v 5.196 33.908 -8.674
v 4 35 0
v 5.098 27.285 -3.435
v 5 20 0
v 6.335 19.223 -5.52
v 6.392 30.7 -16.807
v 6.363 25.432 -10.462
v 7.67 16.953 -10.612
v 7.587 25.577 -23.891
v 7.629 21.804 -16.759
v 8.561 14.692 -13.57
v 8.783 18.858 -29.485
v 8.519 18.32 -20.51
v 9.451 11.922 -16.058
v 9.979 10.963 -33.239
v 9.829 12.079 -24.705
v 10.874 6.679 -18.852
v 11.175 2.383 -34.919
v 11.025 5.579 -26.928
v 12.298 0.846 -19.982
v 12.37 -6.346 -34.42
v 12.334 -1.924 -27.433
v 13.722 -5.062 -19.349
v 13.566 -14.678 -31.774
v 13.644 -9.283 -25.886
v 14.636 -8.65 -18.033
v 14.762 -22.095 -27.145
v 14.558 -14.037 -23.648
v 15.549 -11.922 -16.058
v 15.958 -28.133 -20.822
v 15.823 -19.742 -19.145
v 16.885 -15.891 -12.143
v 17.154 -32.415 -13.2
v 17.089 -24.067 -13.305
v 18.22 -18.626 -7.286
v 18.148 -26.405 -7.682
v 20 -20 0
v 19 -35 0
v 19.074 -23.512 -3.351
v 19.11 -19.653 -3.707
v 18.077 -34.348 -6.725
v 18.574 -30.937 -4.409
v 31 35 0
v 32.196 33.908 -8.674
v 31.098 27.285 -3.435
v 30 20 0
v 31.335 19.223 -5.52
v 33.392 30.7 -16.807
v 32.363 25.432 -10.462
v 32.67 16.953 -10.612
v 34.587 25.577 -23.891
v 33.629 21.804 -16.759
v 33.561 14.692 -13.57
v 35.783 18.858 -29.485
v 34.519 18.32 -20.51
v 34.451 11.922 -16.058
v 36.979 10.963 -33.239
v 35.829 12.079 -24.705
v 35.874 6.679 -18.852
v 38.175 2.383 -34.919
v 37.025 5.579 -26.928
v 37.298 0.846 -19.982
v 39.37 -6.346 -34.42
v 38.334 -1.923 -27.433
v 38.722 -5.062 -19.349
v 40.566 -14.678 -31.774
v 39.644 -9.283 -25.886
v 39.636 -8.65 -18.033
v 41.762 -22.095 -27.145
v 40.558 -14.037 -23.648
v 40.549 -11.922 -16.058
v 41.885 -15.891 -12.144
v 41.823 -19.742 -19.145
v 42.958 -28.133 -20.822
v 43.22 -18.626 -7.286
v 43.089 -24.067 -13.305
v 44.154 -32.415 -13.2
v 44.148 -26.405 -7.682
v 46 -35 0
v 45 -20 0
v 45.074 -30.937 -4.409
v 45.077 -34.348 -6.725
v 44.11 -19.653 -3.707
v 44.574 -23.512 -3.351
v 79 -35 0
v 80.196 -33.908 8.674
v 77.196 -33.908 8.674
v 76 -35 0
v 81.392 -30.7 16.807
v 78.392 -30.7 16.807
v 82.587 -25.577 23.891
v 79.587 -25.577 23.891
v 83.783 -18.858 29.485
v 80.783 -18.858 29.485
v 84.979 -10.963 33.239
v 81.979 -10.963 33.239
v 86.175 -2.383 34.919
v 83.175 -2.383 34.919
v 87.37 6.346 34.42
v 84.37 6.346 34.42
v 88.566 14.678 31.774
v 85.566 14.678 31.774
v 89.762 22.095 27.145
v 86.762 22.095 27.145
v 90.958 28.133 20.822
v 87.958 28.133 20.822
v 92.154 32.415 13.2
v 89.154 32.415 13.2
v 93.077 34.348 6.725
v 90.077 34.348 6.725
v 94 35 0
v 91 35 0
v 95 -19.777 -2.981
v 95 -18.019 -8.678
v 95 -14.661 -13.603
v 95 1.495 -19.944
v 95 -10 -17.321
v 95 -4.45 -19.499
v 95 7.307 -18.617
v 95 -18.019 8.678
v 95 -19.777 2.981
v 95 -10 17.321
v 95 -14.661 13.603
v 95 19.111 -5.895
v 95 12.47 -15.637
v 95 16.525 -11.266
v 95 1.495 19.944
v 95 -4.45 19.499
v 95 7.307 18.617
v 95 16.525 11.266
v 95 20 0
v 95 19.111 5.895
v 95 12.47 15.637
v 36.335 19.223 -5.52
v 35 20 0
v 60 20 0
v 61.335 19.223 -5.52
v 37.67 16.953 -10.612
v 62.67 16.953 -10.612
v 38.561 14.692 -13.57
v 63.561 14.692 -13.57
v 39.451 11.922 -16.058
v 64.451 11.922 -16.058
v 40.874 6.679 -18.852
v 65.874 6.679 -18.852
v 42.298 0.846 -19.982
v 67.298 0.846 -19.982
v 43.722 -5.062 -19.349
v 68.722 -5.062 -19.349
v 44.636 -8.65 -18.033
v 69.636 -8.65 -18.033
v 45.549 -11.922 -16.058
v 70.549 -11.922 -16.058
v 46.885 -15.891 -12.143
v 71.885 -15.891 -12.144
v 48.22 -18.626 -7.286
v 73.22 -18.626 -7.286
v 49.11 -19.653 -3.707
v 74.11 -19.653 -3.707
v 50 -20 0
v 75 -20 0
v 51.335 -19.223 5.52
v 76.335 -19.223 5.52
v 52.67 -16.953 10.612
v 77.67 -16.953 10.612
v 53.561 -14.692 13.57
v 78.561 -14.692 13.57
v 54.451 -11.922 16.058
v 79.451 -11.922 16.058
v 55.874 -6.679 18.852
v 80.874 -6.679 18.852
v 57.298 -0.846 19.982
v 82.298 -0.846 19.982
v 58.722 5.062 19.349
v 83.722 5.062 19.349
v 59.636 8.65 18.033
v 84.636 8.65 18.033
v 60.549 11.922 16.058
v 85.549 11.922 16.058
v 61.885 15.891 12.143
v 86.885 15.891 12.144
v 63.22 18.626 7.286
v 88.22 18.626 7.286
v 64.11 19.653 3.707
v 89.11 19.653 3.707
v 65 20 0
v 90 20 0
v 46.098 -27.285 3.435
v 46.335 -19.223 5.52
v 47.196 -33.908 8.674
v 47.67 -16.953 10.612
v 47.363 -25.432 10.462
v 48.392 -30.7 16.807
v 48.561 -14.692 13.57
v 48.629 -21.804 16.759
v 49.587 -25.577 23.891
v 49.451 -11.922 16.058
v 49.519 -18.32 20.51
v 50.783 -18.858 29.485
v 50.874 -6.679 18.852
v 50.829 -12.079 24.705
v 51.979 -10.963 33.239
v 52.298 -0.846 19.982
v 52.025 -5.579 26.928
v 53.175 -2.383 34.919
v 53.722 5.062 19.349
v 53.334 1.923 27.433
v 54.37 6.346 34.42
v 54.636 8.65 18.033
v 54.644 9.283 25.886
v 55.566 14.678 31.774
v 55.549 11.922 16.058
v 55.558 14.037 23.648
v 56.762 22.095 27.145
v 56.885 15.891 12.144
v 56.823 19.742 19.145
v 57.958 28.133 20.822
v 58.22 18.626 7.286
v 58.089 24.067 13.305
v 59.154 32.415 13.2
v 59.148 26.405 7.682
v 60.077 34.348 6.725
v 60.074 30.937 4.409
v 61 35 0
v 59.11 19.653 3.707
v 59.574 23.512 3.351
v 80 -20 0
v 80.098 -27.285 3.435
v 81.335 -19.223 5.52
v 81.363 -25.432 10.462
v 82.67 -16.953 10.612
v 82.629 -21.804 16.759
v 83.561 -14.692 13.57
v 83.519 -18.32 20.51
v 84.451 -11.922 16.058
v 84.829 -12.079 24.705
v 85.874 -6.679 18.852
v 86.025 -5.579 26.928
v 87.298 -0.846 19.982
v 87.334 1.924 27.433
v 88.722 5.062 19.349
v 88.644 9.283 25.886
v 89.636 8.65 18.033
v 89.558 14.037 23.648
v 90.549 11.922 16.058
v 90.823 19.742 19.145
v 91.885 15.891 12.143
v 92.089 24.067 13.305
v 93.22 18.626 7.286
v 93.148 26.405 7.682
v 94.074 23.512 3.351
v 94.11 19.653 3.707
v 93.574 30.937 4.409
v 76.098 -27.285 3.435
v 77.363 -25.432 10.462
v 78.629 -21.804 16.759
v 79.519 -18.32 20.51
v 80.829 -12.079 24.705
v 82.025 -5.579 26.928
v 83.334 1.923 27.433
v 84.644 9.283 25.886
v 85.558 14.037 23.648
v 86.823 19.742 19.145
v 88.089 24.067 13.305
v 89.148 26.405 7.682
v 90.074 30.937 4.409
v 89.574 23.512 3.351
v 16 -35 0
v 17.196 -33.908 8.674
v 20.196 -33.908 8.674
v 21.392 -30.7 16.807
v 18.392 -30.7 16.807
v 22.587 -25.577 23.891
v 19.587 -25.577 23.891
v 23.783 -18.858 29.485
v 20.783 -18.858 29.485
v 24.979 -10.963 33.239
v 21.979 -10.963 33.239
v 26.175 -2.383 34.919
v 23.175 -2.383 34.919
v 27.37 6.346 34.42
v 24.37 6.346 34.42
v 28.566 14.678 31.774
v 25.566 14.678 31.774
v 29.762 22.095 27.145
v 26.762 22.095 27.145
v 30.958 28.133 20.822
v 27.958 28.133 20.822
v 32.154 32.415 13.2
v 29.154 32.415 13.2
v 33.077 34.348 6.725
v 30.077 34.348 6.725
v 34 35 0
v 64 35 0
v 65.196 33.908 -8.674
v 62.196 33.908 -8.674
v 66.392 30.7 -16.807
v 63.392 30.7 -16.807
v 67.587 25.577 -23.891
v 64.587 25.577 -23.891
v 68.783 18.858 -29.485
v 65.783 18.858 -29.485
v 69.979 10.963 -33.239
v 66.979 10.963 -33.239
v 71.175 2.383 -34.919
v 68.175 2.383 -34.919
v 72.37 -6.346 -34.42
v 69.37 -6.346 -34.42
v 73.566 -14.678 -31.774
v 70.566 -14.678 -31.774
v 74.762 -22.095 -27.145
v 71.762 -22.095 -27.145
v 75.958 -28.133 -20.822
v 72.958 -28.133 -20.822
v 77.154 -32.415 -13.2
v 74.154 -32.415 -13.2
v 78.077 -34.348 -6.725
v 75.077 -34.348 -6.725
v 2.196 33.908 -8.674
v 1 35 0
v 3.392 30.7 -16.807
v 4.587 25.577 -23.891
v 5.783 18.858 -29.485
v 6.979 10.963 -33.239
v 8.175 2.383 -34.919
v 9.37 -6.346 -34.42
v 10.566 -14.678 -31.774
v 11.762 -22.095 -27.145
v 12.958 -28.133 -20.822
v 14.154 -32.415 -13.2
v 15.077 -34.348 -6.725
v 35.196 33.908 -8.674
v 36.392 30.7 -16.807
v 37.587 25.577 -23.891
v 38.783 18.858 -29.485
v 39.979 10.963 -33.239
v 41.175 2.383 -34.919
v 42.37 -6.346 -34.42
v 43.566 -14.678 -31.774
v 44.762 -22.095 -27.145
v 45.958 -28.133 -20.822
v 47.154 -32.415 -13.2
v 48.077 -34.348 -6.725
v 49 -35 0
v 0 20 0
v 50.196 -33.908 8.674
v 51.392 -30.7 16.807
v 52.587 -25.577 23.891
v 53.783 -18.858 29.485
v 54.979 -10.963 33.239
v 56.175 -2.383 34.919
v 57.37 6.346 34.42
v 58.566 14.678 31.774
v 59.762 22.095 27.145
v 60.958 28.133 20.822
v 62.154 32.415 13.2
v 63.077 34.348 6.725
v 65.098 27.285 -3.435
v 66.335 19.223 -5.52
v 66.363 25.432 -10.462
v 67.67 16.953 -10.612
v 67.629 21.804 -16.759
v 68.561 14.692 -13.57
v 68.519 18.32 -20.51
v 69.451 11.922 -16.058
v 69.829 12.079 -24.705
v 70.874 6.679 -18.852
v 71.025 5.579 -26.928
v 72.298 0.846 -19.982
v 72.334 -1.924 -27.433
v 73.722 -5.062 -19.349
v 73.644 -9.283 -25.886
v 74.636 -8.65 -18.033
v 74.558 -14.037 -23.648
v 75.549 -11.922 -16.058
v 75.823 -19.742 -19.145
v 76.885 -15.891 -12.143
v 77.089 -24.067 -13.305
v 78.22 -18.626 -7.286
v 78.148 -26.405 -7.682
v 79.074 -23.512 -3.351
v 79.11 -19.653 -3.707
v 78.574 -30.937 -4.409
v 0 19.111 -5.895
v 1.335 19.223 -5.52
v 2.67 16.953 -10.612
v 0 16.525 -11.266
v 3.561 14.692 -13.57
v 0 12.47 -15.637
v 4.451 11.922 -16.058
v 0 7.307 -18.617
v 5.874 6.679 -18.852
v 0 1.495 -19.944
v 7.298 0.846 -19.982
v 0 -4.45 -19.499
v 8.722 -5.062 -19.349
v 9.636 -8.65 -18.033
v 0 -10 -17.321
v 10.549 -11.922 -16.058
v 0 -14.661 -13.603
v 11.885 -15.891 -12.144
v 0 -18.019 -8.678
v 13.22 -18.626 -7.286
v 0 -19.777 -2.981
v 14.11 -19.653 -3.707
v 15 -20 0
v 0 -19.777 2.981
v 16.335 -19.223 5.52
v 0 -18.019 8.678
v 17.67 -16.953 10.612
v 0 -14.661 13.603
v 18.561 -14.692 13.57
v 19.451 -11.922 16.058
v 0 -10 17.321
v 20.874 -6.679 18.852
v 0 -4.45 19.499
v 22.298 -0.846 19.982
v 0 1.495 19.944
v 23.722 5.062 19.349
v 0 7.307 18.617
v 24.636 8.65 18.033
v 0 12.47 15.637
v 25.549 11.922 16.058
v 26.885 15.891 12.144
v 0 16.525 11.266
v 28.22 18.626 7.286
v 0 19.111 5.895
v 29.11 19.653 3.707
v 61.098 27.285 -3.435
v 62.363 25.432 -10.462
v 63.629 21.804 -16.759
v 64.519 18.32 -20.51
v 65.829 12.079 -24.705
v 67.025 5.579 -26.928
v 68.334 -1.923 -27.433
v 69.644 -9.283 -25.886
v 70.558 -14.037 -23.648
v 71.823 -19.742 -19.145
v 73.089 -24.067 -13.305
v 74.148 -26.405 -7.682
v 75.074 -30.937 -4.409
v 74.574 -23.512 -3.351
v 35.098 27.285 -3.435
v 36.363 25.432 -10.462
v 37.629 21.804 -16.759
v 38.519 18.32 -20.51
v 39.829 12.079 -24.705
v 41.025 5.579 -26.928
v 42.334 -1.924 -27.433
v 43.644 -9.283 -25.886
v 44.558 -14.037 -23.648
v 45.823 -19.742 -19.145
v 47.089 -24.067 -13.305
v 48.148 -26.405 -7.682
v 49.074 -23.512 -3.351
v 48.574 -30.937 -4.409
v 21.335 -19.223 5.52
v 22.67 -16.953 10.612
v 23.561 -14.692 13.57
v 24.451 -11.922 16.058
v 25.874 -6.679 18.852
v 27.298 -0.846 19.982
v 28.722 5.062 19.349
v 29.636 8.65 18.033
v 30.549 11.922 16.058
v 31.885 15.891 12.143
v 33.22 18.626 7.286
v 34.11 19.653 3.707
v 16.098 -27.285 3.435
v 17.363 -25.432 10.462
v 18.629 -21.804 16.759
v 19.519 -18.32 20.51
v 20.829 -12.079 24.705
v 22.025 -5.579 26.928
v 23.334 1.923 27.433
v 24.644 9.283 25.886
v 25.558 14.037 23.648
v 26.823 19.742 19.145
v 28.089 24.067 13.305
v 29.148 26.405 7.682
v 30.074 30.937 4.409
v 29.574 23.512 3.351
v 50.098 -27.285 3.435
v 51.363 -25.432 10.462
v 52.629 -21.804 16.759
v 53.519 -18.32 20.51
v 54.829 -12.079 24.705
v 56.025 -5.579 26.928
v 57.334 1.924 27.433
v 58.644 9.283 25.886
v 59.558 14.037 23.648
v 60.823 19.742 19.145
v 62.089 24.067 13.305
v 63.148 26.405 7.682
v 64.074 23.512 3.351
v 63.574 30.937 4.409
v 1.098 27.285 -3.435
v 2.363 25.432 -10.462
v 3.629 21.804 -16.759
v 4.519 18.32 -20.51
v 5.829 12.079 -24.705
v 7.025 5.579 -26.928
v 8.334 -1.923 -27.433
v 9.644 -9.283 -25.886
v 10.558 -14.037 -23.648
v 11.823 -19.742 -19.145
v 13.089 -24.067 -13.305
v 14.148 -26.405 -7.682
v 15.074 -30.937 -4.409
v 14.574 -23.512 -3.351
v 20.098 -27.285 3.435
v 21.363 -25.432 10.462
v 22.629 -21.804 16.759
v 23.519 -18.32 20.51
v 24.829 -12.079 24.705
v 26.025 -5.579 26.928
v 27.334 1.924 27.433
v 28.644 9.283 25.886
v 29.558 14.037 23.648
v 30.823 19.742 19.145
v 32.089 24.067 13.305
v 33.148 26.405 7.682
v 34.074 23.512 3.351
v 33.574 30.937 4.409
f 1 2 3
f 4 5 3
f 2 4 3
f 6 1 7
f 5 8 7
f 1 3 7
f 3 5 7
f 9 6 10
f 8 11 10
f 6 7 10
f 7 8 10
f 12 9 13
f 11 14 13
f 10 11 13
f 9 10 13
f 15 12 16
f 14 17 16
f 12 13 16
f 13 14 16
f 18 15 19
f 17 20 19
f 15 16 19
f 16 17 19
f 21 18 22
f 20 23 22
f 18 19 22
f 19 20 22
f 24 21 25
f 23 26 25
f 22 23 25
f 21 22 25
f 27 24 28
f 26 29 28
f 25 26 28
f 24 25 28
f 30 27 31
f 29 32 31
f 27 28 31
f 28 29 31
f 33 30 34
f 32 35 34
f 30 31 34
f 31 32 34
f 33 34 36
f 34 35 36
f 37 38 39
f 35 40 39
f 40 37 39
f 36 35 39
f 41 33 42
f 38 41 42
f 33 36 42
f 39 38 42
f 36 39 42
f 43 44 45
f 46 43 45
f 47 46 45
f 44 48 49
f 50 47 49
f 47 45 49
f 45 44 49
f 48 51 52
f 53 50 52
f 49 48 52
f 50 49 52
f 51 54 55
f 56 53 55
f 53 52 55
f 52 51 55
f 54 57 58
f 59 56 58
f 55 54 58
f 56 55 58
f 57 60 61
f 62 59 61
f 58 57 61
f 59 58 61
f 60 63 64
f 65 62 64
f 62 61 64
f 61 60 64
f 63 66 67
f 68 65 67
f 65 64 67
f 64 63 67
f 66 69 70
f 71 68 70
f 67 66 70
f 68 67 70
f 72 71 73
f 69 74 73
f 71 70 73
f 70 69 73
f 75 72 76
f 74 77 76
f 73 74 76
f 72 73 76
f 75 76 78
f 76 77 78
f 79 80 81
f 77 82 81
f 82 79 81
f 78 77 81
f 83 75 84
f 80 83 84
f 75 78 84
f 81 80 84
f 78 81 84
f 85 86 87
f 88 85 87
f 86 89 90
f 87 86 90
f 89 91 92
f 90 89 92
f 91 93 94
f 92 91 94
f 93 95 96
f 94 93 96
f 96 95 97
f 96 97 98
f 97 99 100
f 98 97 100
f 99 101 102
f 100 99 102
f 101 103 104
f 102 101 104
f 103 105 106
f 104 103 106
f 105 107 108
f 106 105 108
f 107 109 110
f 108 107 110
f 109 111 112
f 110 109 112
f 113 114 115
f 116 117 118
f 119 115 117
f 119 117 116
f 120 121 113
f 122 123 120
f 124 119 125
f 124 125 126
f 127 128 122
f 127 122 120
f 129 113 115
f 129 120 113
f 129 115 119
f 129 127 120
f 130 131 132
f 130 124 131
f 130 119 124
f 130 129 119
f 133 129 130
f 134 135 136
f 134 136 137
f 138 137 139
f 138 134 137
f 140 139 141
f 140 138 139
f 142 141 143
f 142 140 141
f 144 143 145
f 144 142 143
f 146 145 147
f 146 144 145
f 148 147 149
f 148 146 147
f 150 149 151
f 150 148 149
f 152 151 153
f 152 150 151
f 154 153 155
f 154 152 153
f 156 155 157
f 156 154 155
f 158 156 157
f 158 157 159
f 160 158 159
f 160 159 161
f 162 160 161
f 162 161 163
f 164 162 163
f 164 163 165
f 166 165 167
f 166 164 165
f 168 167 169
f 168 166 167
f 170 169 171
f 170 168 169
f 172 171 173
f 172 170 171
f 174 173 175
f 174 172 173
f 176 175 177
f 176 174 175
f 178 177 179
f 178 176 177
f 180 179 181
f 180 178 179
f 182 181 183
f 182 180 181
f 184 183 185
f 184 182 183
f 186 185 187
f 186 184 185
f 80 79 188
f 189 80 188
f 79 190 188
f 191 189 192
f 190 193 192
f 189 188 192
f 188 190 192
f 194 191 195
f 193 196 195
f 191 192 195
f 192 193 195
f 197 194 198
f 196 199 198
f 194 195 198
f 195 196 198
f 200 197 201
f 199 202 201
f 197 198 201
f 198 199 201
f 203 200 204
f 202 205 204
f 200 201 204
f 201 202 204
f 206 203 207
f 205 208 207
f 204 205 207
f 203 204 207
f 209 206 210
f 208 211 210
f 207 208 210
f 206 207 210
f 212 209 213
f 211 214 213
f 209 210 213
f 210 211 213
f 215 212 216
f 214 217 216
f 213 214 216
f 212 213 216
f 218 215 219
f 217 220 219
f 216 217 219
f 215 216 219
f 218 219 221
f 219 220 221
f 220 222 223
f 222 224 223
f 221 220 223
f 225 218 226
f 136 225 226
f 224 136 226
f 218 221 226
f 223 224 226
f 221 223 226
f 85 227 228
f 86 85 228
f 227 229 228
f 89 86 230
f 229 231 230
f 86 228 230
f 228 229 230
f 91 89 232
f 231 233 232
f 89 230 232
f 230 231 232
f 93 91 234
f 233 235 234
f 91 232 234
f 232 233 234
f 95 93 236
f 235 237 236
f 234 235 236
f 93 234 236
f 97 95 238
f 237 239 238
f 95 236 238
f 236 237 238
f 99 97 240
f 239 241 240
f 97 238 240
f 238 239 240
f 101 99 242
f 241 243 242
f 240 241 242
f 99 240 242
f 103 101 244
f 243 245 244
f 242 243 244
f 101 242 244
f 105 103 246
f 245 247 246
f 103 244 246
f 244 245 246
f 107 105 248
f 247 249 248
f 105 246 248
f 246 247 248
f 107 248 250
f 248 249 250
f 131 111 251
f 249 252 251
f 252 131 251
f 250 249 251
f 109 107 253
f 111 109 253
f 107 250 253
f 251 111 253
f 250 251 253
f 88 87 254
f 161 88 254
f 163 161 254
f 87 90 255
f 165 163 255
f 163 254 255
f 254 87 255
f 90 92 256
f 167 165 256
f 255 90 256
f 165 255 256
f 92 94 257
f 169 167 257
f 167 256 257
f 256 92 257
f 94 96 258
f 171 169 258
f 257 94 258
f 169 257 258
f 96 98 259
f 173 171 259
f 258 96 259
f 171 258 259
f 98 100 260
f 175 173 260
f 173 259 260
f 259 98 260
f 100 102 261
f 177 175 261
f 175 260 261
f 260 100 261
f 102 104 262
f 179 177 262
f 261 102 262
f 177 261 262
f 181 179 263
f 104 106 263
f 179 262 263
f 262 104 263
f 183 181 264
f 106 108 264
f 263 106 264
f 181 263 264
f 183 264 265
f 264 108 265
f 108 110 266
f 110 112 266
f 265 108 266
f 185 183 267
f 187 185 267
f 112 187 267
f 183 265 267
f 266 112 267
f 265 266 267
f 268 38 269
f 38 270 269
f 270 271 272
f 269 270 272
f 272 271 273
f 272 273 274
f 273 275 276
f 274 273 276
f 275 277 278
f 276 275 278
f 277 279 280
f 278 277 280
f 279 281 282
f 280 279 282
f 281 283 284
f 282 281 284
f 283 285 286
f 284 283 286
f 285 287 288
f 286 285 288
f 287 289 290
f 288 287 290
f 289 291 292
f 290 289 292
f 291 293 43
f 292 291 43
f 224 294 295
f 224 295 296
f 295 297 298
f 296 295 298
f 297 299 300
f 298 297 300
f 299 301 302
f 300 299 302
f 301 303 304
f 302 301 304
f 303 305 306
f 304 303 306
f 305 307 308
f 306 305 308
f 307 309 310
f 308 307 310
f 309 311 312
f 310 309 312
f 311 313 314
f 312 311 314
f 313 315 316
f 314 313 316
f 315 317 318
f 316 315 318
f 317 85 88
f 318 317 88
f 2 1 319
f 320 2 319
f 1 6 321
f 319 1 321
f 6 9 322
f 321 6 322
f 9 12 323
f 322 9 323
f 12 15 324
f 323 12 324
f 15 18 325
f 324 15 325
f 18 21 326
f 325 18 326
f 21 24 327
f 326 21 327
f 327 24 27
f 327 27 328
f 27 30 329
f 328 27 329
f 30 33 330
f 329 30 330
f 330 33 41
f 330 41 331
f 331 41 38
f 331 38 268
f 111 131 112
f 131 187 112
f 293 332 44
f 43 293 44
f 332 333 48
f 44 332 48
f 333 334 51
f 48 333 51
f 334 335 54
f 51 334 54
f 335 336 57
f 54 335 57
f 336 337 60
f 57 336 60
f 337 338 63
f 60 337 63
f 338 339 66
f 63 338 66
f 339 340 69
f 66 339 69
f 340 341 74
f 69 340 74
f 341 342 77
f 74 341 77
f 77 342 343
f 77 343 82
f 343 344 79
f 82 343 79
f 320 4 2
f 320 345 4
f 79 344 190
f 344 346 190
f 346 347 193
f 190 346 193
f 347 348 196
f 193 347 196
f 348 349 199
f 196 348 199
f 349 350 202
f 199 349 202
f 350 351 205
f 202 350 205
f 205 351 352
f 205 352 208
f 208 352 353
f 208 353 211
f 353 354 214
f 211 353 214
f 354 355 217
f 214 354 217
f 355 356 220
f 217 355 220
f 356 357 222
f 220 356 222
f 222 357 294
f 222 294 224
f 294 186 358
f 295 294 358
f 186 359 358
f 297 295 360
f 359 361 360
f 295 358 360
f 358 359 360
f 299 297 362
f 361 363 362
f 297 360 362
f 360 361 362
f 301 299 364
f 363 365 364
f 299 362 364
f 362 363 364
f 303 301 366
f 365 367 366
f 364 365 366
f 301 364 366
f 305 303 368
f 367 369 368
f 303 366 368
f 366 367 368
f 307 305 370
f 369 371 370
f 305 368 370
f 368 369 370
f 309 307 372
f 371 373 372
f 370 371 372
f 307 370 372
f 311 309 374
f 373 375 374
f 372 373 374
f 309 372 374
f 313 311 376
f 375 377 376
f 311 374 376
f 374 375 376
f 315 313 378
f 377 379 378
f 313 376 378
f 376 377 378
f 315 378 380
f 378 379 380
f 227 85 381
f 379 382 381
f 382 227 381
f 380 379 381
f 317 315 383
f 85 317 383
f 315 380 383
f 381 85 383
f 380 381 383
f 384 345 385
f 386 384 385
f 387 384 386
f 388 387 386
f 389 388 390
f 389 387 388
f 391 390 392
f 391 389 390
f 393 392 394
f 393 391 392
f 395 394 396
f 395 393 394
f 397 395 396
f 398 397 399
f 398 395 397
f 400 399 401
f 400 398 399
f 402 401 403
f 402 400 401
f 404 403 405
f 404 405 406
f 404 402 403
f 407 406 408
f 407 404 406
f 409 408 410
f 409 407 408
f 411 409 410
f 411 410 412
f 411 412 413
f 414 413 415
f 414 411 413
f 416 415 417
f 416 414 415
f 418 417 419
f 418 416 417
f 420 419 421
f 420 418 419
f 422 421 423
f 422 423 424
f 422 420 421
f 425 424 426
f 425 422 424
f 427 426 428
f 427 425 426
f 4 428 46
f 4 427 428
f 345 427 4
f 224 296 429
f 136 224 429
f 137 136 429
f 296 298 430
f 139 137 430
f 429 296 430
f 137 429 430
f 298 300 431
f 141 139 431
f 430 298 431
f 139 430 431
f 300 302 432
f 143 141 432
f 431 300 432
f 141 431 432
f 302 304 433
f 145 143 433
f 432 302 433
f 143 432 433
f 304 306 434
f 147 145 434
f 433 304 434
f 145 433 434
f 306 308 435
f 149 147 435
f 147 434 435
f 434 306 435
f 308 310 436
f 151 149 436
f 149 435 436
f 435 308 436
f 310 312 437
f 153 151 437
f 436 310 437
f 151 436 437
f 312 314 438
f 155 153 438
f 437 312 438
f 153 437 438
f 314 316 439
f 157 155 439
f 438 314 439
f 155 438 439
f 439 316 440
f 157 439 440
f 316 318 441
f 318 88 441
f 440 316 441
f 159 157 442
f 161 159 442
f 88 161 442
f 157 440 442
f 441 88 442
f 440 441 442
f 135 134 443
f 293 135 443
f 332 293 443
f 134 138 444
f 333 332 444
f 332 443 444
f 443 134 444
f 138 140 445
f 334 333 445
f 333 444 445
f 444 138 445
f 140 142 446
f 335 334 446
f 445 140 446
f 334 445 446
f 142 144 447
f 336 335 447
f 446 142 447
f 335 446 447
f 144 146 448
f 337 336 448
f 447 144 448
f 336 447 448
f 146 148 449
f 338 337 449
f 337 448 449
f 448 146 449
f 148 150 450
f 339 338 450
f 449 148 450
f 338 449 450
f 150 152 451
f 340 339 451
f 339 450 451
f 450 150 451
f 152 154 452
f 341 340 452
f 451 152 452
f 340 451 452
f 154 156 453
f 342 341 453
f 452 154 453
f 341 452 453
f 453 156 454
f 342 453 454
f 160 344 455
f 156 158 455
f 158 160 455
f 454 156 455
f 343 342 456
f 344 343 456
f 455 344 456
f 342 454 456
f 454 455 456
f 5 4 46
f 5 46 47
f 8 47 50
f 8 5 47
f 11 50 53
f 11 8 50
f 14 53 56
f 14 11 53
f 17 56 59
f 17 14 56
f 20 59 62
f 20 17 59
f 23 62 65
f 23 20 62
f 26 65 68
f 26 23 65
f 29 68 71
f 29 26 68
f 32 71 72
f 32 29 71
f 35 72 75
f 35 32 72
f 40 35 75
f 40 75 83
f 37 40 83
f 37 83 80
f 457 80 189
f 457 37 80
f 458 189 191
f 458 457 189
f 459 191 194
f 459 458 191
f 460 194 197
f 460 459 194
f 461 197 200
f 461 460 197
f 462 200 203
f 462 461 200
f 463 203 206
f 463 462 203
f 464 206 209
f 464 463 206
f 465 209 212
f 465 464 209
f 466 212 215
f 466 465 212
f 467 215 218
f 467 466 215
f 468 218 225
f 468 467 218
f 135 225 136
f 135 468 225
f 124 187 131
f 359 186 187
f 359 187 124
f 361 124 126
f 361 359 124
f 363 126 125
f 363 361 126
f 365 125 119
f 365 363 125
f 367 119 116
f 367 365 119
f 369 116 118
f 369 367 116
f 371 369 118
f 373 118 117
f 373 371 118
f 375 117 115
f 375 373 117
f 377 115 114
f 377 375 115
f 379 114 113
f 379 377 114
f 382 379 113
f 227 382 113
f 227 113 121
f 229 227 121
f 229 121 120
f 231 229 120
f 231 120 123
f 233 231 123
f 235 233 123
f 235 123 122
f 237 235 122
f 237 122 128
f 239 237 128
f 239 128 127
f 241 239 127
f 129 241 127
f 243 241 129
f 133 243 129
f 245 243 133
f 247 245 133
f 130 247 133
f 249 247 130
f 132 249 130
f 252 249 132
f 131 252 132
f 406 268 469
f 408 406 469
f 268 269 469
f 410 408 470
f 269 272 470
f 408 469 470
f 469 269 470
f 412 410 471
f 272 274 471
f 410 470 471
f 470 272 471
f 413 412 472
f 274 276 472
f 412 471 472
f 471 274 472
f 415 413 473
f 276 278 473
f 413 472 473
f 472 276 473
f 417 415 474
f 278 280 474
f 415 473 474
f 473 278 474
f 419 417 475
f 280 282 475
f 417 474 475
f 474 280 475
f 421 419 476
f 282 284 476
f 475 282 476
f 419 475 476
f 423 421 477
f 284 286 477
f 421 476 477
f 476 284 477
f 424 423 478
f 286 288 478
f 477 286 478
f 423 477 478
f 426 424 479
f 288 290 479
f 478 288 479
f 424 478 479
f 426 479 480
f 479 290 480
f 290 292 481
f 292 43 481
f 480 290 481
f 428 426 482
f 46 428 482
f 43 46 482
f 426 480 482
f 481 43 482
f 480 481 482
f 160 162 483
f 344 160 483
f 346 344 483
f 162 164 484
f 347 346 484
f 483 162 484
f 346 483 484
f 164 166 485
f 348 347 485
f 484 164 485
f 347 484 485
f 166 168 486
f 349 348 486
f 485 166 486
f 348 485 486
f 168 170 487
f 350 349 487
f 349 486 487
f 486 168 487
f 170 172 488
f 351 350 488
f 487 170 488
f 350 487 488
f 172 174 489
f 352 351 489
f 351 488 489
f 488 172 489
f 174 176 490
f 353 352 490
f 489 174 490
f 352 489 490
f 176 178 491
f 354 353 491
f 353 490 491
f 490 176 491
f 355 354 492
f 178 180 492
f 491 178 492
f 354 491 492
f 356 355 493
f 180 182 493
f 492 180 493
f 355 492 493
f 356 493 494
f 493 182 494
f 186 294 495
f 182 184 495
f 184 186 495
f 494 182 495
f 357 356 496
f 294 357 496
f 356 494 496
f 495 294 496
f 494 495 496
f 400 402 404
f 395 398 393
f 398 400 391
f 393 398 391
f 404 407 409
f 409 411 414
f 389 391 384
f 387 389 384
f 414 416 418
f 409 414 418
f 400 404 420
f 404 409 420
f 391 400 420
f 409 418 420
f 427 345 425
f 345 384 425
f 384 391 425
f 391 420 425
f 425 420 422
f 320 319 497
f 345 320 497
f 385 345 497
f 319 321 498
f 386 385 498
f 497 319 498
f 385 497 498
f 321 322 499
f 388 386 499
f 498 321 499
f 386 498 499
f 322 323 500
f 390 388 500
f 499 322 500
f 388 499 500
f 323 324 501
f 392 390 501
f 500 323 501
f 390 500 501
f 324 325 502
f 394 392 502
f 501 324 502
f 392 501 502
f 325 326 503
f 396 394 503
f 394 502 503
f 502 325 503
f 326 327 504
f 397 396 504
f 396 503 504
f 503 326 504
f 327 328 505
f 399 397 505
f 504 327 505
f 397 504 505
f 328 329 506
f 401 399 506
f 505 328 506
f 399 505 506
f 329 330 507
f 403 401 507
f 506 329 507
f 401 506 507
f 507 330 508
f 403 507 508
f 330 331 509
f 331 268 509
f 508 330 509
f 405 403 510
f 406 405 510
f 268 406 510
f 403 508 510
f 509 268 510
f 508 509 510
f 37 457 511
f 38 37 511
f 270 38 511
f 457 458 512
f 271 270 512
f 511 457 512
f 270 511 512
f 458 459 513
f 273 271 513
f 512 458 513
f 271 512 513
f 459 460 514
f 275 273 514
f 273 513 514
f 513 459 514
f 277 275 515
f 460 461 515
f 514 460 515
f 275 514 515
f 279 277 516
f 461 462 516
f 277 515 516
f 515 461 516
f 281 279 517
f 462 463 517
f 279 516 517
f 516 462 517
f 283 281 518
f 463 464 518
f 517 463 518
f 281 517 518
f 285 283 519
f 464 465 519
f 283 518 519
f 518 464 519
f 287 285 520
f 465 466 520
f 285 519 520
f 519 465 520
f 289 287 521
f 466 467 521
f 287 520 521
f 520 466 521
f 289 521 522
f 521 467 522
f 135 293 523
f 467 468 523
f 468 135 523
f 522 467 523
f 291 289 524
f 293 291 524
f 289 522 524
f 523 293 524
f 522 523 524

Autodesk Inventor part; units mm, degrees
ref_plane "YZ Plane" through (0, 0, 0) normal (1, 0, 0) x (0, 1, 0)
ref_plane "XZ Plane" through (0, 0, 0) normal (0, 1, 0) x (-1, 0, 0)
ref_plane "XY Plane" through (0, 0, 0) normal (0, 0, 1) x (1, 0, 0)
sketch "Sketch1" plane through (0, 0, 0) normal (0, 0, 1) x (1, 0, 0)
  line L0 (0, 20) -> (5, 20)
  line L1 (4, 35) -> (5, 20)
  line L2 (1, 35) -> (0, 20)
  line L3 (1, 35) -> (4, 35)
  point P0 (0, 0)
  dimension "d1" = 5
coil "Coil1" sketch "Sketch1" operation add axis through (-10, 0, 0) along (1, 0, 0) pitch 30 turns 3 hand left
sketch "Sketch2" plane through (0, 0, 0) normal (1, 0, 0) x (0, 1, 0)
  circle A0 centre (0, 0) radius 20
  point P0 (20, 0)
extrude "Extrusion1" add sketch "Sketch2" along normal blind 95
properties part number "rollers"
